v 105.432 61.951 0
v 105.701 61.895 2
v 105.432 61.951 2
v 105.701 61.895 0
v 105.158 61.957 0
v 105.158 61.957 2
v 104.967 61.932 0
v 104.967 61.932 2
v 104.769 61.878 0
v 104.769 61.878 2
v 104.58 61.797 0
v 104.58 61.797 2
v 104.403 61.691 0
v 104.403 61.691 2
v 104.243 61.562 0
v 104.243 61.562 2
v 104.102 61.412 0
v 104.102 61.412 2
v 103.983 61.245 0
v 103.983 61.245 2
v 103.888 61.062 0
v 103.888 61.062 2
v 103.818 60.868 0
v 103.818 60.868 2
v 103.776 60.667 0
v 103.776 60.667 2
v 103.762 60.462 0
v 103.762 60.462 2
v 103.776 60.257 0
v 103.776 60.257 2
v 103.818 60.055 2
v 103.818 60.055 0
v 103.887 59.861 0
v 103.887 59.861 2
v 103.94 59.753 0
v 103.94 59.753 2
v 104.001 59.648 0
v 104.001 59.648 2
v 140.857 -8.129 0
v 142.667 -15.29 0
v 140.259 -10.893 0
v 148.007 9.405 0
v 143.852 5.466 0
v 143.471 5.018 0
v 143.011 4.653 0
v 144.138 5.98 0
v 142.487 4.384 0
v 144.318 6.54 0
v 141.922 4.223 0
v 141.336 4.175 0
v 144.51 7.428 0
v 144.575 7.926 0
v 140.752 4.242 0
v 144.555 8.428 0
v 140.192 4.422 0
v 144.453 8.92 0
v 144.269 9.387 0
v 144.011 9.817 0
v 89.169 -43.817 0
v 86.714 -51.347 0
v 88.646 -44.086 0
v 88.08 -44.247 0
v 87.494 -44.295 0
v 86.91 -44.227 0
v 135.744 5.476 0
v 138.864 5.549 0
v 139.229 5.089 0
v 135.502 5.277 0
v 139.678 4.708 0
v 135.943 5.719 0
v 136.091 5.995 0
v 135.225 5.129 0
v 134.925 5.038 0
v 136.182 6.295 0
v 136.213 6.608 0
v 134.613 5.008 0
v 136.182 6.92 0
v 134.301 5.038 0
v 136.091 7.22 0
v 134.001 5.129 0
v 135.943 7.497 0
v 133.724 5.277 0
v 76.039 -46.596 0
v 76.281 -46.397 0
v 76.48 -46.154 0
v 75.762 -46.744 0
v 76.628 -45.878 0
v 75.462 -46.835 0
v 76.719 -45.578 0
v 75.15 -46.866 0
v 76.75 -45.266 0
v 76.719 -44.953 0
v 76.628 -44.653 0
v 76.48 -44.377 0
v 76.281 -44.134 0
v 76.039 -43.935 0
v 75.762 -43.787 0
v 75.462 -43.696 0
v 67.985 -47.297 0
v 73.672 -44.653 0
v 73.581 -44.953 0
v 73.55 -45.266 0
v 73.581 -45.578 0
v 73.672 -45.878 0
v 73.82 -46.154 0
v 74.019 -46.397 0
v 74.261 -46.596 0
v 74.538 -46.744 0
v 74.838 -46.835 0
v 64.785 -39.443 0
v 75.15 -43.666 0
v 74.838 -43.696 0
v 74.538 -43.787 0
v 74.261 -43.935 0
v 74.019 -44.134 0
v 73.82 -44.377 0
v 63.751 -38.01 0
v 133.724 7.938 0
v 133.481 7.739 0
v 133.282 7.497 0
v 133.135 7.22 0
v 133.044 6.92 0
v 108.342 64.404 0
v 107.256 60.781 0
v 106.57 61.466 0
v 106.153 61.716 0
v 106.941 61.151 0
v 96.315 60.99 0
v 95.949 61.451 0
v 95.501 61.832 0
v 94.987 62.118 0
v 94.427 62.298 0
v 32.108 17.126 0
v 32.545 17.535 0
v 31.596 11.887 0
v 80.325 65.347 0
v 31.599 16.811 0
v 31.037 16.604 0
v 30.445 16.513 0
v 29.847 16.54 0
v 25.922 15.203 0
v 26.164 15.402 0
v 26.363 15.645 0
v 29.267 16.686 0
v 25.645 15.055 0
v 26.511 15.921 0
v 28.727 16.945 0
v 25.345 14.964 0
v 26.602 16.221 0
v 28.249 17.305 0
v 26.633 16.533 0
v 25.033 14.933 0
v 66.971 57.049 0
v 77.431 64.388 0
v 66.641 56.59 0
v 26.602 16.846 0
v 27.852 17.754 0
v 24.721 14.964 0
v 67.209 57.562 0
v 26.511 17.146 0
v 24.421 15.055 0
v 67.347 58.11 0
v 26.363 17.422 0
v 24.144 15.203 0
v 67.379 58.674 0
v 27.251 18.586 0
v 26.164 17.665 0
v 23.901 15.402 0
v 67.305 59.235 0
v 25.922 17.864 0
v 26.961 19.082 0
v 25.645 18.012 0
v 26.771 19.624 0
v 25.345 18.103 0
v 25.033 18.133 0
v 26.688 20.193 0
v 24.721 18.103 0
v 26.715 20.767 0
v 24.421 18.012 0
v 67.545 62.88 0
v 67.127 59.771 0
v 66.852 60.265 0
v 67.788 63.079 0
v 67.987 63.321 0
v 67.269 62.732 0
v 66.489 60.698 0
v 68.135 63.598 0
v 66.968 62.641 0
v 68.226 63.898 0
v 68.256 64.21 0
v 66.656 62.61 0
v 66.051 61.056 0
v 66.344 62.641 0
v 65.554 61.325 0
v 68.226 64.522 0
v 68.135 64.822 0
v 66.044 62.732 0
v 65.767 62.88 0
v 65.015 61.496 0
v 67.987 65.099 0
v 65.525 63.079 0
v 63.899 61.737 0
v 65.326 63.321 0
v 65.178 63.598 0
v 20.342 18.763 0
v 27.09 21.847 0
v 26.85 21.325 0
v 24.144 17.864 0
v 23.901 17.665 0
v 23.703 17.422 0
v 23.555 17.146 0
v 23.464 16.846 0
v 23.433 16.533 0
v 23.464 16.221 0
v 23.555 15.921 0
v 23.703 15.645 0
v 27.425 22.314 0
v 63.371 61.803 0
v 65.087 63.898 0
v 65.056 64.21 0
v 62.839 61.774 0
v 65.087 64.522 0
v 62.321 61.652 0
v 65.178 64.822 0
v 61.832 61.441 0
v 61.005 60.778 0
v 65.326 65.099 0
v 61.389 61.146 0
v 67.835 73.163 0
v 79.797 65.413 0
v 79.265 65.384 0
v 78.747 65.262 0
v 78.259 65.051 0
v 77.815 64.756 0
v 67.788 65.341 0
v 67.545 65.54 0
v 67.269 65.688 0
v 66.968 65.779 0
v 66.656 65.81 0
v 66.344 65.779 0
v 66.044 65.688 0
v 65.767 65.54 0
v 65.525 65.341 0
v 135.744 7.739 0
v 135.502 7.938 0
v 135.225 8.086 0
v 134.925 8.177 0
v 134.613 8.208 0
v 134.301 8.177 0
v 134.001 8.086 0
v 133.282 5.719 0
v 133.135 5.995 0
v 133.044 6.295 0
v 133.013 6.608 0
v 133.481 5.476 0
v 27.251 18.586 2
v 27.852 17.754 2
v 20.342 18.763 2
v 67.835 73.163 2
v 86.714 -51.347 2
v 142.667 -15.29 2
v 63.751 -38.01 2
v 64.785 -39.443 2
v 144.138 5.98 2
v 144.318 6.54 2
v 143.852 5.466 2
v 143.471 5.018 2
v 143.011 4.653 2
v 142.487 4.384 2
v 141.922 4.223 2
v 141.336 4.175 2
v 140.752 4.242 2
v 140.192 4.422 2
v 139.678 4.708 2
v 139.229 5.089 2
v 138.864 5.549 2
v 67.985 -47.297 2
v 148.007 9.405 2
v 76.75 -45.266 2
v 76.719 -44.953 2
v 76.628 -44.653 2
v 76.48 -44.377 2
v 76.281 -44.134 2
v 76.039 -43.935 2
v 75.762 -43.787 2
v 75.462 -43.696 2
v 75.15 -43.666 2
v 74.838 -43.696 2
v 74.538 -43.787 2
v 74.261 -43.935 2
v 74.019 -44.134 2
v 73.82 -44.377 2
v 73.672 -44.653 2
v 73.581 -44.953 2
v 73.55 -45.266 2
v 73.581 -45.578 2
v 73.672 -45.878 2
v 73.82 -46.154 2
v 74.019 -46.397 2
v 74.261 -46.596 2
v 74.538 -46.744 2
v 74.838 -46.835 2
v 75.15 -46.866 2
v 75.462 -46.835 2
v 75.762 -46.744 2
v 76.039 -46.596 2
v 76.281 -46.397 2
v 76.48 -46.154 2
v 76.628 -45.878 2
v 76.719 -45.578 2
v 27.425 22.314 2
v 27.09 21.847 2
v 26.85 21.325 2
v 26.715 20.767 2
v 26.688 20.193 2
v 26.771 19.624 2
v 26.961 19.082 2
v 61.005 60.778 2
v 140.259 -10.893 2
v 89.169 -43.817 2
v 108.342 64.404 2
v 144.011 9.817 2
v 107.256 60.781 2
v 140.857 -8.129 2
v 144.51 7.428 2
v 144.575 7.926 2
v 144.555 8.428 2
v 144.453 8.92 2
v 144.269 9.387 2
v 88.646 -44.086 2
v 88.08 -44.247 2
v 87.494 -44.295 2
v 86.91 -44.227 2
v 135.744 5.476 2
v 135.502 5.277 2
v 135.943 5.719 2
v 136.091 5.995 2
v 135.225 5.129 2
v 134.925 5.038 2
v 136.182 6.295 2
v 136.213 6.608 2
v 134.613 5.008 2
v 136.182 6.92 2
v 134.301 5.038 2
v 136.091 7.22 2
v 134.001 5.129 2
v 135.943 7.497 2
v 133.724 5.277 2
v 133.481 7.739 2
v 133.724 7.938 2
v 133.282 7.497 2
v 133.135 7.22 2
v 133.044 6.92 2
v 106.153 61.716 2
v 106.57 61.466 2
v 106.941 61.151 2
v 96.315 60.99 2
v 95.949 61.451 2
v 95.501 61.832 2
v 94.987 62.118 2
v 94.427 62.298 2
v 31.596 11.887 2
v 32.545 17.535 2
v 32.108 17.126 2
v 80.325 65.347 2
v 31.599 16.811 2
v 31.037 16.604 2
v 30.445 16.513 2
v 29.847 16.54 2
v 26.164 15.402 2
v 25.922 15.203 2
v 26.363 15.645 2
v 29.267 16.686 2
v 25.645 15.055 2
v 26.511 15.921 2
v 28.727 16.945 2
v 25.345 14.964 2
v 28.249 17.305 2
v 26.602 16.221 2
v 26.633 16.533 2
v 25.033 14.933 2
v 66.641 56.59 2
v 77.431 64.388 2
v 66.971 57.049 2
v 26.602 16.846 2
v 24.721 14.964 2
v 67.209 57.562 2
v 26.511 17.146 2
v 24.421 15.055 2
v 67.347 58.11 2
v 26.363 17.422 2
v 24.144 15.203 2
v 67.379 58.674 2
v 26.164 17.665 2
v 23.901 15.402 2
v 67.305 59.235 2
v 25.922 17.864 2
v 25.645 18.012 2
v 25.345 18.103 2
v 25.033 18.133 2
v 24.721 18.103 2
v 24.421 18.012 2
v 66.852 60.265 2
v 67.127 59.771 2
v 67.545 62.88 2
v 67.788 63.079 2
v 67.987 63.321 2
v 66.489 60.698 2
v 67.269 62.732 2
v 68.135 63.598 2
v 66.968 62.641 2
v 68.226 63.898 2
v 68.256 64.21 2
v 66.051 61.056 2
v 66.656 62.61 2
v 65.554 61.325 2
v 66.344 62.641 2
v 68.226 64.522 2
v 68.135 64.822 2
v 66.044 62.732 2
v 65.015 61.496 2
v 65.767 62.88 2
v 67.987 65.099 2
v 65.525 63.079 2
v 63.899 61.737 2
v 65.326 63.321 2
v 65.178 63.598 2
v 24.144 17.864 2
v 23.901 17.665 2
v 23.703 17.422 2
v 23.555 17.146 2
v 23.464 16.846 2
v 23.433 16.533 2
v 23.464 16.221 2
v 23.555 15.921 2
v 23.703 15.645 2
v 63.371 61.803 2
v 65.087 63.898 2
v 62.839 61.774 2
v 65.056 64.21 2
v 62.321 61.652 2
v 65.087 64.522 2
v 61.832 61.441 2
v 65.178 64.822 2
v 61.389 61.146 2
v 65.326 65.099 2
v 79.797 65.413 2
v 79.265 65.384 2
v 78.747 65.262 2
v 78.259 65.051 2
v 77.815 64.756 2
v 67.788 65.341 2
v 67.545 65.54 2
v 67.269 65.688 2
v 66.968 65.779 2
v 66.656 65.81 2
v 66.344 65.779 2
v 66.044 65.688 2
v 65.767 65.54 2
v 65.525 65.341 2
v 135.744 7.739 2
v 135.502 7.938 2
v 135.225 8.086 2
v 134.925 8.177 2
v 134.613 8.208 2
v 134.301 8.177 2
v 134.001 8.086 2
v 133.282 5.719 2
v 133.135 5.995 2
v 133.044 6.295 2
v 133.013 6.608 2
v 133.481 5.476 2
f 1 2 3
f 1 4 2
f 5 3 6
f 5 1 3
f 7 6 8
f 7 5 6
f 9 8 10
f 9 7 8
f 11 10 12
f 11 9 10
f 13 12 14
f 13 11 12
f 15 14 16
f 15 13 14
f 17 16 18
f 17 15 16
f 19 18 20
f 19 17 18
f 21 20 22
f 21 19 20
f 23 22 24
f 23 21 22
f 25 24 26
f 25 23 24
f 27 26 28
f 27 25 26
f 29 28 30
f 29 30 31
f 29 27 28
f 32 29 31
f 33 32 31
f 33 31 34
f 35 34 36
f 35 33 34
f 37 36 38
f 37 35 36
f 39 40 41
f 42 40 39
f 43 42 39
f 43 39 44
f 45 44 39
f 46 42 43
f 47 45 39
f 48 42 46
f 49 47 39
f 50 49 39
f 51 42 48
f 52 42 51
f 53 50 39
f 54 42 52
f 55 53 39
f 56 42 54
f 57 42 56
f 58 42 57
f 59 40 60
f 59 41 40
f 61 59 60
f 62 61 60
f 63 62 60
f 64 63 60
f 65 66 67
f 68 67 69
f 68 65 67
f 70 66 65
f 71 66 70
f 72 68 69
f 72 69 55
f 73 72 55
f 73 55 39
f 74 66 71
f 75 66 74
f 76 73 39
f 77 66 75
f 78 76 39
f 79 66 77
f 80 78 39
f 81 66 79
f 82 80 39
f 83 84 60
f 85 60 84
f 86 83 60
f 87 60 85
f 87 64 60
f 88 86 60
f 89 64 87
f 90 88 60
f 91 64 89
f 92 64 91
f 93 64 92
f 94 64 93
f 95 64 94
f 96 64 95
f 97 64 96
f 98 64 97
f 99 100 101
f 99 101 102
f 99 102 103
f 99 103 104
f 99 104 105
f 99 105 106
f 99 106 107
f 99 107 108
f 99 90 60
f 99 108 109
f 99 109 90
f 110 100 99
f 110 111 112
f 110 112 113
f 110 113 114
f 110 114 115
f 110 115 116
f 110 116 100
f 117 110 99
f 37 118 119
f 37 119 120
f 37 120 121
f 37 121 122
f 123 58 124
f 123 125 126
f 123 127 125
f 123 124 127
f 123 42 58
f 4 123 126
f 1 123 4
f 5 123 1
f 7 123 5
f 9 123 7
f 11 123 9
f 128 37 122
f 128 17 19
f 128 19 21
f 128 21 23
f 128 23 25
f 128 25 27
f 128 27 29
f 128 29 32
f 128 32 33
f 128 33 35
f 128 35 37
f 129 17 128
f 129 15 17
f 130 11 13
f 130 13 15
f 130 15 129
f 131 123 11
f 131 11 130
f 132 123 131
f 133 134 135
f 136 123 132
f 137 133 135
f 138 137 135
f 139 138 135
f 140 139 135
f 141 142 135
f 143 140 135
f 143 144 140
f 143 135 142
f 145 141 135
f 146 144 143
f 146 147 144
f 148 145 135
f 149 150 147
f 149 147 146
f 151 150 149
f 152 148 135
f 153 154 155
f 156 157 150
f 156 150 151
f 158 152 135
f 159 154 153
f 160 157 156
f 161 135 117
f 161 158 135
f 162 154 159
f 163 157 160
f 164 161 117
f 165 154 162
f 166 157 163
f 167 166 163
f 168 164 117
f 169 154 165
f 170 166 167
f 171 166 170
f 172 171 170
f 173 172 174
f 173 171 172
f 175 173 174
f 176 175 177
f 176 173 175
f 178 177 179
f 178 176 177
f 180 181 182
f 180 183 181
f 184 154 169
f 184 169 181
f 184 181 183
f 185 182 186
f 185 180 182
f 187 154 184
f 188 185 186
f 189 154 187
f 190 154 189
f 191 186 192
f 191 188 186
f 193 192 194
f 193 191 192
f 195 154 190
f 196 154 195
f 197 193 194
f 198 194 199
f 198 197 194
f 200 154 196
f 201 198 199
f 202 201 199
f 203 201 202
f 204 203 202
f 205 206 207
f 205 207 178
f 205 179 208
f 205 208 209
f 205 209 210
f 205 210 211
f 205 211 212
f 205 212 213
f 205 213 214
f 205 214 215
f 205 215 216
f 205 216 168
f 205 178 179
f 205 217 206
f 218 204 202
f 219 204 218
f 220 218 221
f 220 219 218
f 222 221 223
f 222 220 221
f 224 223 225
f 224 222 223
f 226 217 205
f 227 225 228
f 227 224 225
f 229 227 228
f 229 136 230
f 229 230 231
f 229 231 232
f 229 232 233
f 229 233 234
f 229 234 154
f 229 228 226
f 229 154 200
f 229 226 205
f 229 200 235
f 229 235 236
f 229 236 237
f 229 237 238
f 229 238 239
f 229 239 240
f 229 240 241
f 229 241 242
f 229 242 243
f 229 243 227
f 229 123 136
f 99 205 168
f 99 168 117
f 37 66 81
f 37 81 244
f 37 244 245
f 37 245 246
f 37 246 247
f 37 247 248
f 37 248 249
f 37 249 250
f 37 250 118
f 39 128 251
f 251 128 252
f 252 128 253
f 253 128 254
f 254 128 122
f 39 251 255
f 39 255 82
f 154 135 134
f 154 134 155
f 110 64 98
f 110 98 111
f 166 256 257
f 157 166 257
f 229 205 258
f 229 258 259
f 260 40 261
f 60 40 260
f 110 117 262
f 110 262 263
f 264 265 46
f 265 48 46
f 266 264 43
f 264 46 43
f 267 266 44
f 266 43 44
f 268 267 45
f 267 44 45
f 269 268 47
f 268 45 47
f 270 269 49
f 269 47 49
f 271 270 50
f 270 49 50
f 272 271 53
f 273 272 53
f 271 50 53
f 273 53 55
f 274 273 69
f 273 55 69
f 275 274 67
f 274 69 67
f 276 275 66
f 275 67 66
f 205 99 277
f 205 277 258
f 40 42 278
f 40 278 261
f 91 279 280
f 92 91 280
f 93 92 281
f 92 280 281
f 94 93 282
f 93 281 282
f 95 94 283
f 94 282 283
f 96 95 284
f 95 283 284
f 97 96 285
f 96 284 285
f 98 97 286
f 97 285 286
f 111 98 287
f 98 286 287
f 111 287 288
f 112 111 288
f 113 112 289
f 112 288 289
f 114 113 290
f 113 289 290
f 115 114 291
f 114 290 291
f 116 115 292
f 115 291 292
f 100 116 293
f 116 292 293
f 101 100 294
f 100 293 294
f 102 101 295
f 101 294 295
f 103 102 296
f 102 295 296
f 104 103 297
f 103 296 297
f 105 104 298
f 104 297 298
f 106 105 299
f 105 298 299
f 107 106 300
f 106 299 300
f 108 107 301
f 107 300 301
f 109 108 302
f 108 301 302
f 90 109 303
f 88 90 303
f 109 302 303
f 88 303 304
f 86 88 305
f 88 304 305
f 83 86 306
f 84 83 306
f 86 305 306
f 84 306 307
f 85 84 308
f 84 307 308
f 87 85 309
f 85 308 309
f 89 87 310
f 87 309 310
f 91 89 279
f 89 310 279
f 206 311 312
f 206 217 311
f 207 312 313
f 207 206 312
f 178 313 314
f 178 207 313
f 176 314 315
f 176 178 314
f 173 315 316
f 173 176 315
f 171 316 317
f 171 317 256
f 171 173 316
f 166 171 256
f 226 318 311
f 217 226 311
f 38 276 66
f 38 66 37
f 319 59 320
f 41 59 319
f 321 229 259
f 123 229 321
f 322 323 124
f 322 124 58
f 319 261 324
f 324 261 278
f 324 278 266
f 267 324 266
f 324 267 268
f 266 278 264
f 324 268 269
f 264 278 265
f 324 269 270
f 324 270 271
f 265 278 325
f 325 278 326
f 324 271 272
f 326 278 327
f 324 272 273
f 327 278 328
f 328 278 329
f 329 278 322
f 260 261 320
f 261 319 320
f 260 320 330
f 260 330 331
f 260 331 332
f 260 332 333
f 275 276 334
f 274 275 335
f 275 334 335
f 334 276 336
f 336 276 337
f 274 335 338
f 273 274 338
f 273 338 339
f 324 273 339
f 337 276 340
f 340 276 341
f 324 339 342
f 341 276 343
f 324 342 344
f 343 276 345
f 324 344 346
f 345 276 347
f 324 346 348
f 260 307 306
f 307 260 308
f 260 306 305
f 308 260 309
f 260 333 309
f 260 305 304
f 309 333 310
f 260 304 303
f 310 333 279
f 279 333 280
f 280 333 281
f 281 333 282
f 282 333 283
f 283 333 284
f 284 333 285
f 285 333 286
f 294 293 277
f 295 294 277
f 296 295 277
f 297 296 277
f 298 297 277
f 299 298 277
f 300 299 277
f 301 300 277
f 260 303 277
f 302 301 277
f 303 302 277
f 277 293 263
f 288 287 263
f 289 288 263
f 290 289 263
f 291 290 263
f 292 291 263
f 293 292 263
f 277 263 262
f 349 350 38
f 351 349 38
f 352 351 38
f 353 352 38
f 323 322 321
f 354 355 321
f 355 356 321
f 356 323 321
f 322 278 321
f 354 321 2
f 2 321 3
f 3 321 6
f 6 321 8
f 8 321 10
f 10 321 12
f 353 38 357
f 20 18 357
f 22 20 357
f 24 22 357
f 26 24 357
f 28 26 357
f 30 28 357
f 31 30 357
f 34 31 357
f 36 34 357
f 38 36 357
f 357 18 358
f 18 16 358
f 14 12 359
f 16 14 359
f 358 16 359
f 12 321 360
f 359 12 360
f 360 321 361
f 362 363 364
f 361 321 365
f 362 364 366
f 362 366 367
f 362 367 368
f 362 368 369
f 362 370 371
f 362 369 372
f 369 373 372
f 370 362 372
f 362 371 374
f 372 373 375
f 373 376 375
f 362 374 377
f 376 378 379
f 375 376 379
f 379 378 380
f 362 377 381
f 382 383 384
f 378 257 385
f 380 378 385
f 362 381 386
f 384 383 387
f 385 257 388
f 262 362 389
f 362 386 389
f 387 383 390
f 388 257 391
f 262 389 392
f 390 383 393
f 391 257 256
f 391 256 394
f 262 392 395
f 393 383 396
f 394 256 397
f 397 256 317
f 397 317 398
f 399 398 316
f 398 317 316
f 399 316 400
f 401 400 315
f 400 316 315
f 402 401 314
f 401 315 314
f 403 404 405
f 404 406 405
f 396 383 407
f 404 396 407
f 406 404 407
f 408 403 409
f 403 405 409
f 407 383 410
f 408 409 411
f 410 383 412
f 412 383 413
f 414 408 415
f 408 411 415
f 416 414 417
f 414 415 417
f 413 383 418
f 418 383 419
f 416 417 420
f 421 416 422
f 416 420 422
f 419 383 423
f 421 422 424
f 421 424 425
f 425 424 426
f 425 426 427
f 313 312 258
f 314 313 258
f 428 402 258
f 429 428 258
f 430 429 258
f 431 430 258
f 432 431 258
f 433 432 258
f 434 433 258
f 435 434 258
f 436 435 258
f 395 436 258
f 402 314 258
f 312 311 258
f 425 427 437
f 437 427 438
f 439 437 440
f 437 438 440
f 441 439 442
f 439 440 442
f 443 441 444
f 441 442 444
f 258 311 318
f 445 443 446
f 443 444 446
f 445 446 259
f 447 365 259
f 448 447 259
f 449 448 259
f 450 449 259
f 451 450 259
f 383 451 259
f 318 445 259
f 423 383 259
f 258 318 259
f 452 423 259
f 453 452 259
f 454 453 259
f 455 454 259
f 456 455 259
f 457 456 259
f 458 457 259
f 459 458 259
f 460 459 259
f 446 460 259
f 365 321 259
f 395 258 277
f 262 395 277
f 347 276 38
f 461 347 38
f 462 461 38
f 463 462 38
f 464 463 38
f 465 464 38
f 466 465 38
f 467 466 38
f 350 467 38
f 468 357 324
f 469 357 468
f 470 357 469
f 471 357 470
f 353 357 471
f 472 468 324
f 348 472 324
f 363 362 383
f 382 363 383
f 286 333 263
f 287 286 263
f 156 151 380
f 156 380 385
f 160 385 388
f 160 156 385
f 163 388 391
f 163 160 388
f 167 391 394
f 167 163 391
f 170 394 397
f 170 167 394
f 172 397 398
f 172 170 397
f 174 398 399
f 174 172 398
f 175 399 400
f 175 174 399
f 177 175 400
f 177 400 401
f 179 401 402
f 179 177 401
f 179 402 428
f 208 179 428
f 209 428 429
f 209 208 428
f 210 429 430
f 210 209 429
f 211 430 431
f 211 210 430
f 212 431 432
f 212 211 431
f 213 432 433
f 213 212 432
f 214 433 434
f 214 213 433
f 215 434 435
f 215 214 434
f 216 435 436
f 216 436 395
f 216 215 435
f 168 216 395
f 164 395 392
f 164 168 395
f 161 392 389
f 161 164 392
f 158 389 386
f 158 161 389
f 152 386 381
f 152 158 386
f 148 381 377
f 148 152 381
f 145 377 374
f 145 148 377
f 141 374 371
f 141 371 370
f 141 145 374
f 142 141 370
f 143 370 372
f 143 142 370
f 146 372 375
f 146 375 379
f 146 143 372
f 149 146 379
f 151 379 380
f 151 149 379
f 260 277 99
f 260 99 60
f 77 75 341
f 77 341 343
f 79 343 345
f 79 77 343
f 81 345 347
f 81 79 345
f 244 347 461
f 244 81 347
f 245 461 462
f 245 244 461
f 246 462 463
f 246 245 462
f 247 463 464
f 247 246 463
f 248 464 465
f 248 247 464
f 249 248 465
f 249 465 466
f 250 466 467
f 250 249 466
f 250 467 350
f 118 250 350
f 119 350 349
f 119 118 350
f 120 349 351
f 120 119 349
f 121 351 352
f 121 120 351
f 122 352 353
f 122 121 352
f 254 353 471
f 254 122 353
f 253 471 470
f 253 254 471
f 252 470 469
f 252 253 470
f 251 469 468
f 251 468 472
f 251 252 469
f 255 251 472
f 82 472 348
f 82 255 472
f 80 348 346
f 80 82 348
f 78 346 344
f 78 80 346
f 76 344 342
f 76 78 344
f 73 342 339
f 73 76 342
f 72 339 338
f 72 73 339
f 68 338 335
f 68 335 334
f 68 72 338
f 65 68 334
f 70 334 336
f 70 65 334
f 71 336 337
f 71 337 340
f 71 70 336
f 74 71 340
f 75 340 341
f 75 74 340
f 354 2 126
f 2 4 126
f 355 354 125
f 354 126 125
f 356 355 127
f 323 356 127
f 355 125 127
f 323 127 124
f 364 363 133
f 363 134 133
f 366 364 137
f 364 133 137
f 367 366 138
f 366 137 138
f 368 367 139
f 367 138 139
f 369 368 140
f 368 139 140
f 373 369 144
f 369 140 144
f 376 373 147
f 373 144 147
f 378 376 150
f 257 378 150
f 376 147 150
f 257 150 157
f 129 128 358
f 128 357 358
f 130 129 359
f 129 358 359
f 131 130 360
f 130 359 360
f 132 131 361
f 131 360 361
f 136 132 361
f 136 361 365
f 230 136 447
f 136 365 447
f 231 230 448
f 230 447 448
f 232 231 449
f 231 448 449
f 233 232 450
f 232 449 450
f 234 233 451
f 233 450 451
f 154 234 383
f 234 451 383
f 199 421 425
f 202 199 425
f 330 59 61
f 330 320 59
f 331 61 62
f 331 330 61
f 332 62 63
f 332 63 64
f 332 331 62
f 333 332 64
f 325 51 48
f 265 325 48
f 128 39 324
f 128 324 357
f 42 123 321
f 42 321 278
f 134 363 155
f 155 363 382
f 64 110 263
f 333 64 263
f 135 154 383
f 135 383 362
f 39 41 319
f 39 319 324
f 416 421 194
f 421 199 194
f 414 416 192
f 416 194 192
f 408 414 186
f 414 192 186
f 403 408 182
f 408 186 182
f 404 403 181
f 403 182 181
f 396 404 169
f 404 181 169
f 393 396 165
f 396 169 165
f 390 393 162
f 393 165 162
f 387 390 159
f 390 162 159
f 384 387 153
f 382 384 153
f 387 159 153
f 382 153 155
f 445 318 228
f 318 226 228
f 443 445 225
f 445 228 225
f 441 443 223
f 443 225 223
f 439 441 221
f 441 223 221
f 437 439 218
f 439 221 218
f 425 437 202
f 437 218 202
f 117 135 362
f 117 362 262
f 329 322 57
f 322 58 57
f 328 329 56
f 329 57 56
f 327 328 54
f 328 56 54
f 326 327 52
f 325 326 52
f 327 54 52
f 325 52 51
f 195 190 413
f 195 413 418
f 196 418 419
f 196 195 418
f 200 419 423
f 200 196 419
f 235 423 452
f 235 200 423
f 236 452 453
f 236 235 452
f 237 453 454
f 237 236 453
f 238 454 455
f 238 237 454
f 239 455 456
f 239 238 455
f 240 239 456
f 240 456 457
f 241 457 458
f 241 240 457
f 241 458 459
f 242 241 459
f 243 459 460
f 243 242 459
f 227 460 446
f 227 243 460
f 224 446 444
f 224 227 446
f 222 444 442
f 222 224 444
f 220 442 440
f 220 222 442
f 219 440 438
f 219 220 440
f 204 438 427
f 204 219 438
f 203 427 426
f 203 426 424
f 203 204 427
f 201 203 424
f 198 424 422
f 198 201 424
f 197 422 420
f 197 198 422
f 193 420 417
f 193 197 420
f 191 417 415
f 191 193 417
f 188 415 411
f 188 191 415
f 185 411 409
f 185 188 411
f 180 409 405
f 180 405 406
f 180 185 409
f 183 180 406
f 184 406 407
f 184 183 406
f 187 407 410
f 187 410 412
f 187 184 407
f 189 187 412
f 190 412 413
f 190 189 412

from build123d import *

# Parameters (mm, degrees)
SKETCH2_R           = 1.6
BOSS_EXTRUDE1_DEPTH = 2
CHAMFER1_SIZE       = 16
CHAMFER1_SIZE2      = 16.908072044
CUT_EXTRUDE1_DEPTH  = 2
CUT_EXTRUDE2_DEPTH  = 2
FILLET1_R           = 3
FILLET2_R           = 1.5
SKETCH5_R           = 1.6
CUT_EXTRUDE3_DEPTH  = 2


with BuildPart() as part:
    # Sketch2 → Boss-Extrude1 (new body)
    with BuildSketch(Plane.XY):
        Polygon((20.342311206, 18.763435595), (67.83529335, 73.163119739), (108.3419511, 64.404376963), (148.006657298, 9.405462998), (142.666805642, -15.289809939), (75.921402075, -58.302296892), align=None)
        with Locations((25.032859693, 16.533479235)):
            Circle(SKETCH2_R, mode=Mode.SUBTRACT)
        with Locations((66.656313732, 64.210054816)):
            Circle(SKETCH2_R, mode=Mode.SUBTRACT)
        with Locations((134.6128014, 6.607635241)):
            Circle(SKETCH2_R, mode=Mode.SUBTRACT)
        Polygon((140.259166073, -10.893068121), (140.856941108, -8.128531088), (95.641730286, 62.034989033), (78.595202191, 65.720954825), (31.596135929, 11.887014645), (63.750974908, -38.009837557), (74.675087949, -53.157166528), align=None, mode=Mode.SUBTRACT)
    extrude(amount=BOSS_EXTRUDE1_DEPTH)

    # Chamfer1
    chamfer1_edges = [part.edges().sort_by_distance(p)[0] for p in [
        (74.675087949, -53.157166528, 1),
    ]]
    chamfer1_side = [part.faces().sort_by_distance(p)[0] for p in [
        (107.467127011, -32.025117325, 1),
    ]]
    chamfer(chamfer1_edges, length=CHAMFER1_SIZE, length2=CHAMFER1_SIZE2, reference=chamfer1_side[0])

    # Sketch3 → Cut-Extrude1 (cut)
    with BuildSketch(Plane.XY.offset(2)):
        Polygon((67.984533977, -47.297069134), (86.714380981, -51.347018482), (75.921402075, -58.302296892), align=None)
    extrude(amount=-CUT_EXTRUDE1_DEPTH, mode=Mode.SUBTRACT)

    # Sketch4 → Cut-Extrude2 (cut)
    with BuildSketch(Plane.XY.offset(2)):
        Polygon((25.857368283, 20.518945125), (30.060999178, 14.690208293), (69.985569717, 60.420838986), (62.168846417, 62.111046782), align=None)
        Polygon((102.03518682, 62.698754981), (106.582335629, 61.715526322), (144.792131882, 8.733984336), (142.787091436, -0.538749114), align=None)
    extrude(amount=-CUT_EXTRUDE2_DEPTH, mode=Mode.SUBTRACT)

    # Fillet1
    fillet1_edges = [part.edges().sort_by_distance(p)[0] for p in [
        (78.595202191, 65.720954825, 1),
        (95.641730286, 62.034989033, 1),
        (88.124336223, -44.490118537, 1),
        (25.857368283, 20.518945125, 1),
        (62.168846417, 62.111046782, 1),
        (69.985569717, 60.420838986, 1),
        (30.060999178, 14.690208293, 1),
        (142.787091436, -0.538749114, 1),
        (106.582335629, 61.715526322, 1),
        (144.792131882, 8.733984336, 1),
    ]]
    fillet(fillet1_edges, radius=FILLET1_R)

    # Fillet2
    fillet2_edges = [part.edges().sort_by_distance(p)[0] for p in [
        (102.03518682, 62.698754981, 1),
    ]]
    fillet(fillet2_edges, radius=FILLET2_R)

    # Sketch5 → Cut-Extrude3 (cut)
    with BuildSketch(Plane.XY.offset(2)):
        with Locations((75.149933369, -45.265554274)):
            Circle(SKETCH5_R)
    extrude(amount=-CUT_EXTRUDE3_DEPTH, mode=Mode.SUBTRACT)


solid = part.part
